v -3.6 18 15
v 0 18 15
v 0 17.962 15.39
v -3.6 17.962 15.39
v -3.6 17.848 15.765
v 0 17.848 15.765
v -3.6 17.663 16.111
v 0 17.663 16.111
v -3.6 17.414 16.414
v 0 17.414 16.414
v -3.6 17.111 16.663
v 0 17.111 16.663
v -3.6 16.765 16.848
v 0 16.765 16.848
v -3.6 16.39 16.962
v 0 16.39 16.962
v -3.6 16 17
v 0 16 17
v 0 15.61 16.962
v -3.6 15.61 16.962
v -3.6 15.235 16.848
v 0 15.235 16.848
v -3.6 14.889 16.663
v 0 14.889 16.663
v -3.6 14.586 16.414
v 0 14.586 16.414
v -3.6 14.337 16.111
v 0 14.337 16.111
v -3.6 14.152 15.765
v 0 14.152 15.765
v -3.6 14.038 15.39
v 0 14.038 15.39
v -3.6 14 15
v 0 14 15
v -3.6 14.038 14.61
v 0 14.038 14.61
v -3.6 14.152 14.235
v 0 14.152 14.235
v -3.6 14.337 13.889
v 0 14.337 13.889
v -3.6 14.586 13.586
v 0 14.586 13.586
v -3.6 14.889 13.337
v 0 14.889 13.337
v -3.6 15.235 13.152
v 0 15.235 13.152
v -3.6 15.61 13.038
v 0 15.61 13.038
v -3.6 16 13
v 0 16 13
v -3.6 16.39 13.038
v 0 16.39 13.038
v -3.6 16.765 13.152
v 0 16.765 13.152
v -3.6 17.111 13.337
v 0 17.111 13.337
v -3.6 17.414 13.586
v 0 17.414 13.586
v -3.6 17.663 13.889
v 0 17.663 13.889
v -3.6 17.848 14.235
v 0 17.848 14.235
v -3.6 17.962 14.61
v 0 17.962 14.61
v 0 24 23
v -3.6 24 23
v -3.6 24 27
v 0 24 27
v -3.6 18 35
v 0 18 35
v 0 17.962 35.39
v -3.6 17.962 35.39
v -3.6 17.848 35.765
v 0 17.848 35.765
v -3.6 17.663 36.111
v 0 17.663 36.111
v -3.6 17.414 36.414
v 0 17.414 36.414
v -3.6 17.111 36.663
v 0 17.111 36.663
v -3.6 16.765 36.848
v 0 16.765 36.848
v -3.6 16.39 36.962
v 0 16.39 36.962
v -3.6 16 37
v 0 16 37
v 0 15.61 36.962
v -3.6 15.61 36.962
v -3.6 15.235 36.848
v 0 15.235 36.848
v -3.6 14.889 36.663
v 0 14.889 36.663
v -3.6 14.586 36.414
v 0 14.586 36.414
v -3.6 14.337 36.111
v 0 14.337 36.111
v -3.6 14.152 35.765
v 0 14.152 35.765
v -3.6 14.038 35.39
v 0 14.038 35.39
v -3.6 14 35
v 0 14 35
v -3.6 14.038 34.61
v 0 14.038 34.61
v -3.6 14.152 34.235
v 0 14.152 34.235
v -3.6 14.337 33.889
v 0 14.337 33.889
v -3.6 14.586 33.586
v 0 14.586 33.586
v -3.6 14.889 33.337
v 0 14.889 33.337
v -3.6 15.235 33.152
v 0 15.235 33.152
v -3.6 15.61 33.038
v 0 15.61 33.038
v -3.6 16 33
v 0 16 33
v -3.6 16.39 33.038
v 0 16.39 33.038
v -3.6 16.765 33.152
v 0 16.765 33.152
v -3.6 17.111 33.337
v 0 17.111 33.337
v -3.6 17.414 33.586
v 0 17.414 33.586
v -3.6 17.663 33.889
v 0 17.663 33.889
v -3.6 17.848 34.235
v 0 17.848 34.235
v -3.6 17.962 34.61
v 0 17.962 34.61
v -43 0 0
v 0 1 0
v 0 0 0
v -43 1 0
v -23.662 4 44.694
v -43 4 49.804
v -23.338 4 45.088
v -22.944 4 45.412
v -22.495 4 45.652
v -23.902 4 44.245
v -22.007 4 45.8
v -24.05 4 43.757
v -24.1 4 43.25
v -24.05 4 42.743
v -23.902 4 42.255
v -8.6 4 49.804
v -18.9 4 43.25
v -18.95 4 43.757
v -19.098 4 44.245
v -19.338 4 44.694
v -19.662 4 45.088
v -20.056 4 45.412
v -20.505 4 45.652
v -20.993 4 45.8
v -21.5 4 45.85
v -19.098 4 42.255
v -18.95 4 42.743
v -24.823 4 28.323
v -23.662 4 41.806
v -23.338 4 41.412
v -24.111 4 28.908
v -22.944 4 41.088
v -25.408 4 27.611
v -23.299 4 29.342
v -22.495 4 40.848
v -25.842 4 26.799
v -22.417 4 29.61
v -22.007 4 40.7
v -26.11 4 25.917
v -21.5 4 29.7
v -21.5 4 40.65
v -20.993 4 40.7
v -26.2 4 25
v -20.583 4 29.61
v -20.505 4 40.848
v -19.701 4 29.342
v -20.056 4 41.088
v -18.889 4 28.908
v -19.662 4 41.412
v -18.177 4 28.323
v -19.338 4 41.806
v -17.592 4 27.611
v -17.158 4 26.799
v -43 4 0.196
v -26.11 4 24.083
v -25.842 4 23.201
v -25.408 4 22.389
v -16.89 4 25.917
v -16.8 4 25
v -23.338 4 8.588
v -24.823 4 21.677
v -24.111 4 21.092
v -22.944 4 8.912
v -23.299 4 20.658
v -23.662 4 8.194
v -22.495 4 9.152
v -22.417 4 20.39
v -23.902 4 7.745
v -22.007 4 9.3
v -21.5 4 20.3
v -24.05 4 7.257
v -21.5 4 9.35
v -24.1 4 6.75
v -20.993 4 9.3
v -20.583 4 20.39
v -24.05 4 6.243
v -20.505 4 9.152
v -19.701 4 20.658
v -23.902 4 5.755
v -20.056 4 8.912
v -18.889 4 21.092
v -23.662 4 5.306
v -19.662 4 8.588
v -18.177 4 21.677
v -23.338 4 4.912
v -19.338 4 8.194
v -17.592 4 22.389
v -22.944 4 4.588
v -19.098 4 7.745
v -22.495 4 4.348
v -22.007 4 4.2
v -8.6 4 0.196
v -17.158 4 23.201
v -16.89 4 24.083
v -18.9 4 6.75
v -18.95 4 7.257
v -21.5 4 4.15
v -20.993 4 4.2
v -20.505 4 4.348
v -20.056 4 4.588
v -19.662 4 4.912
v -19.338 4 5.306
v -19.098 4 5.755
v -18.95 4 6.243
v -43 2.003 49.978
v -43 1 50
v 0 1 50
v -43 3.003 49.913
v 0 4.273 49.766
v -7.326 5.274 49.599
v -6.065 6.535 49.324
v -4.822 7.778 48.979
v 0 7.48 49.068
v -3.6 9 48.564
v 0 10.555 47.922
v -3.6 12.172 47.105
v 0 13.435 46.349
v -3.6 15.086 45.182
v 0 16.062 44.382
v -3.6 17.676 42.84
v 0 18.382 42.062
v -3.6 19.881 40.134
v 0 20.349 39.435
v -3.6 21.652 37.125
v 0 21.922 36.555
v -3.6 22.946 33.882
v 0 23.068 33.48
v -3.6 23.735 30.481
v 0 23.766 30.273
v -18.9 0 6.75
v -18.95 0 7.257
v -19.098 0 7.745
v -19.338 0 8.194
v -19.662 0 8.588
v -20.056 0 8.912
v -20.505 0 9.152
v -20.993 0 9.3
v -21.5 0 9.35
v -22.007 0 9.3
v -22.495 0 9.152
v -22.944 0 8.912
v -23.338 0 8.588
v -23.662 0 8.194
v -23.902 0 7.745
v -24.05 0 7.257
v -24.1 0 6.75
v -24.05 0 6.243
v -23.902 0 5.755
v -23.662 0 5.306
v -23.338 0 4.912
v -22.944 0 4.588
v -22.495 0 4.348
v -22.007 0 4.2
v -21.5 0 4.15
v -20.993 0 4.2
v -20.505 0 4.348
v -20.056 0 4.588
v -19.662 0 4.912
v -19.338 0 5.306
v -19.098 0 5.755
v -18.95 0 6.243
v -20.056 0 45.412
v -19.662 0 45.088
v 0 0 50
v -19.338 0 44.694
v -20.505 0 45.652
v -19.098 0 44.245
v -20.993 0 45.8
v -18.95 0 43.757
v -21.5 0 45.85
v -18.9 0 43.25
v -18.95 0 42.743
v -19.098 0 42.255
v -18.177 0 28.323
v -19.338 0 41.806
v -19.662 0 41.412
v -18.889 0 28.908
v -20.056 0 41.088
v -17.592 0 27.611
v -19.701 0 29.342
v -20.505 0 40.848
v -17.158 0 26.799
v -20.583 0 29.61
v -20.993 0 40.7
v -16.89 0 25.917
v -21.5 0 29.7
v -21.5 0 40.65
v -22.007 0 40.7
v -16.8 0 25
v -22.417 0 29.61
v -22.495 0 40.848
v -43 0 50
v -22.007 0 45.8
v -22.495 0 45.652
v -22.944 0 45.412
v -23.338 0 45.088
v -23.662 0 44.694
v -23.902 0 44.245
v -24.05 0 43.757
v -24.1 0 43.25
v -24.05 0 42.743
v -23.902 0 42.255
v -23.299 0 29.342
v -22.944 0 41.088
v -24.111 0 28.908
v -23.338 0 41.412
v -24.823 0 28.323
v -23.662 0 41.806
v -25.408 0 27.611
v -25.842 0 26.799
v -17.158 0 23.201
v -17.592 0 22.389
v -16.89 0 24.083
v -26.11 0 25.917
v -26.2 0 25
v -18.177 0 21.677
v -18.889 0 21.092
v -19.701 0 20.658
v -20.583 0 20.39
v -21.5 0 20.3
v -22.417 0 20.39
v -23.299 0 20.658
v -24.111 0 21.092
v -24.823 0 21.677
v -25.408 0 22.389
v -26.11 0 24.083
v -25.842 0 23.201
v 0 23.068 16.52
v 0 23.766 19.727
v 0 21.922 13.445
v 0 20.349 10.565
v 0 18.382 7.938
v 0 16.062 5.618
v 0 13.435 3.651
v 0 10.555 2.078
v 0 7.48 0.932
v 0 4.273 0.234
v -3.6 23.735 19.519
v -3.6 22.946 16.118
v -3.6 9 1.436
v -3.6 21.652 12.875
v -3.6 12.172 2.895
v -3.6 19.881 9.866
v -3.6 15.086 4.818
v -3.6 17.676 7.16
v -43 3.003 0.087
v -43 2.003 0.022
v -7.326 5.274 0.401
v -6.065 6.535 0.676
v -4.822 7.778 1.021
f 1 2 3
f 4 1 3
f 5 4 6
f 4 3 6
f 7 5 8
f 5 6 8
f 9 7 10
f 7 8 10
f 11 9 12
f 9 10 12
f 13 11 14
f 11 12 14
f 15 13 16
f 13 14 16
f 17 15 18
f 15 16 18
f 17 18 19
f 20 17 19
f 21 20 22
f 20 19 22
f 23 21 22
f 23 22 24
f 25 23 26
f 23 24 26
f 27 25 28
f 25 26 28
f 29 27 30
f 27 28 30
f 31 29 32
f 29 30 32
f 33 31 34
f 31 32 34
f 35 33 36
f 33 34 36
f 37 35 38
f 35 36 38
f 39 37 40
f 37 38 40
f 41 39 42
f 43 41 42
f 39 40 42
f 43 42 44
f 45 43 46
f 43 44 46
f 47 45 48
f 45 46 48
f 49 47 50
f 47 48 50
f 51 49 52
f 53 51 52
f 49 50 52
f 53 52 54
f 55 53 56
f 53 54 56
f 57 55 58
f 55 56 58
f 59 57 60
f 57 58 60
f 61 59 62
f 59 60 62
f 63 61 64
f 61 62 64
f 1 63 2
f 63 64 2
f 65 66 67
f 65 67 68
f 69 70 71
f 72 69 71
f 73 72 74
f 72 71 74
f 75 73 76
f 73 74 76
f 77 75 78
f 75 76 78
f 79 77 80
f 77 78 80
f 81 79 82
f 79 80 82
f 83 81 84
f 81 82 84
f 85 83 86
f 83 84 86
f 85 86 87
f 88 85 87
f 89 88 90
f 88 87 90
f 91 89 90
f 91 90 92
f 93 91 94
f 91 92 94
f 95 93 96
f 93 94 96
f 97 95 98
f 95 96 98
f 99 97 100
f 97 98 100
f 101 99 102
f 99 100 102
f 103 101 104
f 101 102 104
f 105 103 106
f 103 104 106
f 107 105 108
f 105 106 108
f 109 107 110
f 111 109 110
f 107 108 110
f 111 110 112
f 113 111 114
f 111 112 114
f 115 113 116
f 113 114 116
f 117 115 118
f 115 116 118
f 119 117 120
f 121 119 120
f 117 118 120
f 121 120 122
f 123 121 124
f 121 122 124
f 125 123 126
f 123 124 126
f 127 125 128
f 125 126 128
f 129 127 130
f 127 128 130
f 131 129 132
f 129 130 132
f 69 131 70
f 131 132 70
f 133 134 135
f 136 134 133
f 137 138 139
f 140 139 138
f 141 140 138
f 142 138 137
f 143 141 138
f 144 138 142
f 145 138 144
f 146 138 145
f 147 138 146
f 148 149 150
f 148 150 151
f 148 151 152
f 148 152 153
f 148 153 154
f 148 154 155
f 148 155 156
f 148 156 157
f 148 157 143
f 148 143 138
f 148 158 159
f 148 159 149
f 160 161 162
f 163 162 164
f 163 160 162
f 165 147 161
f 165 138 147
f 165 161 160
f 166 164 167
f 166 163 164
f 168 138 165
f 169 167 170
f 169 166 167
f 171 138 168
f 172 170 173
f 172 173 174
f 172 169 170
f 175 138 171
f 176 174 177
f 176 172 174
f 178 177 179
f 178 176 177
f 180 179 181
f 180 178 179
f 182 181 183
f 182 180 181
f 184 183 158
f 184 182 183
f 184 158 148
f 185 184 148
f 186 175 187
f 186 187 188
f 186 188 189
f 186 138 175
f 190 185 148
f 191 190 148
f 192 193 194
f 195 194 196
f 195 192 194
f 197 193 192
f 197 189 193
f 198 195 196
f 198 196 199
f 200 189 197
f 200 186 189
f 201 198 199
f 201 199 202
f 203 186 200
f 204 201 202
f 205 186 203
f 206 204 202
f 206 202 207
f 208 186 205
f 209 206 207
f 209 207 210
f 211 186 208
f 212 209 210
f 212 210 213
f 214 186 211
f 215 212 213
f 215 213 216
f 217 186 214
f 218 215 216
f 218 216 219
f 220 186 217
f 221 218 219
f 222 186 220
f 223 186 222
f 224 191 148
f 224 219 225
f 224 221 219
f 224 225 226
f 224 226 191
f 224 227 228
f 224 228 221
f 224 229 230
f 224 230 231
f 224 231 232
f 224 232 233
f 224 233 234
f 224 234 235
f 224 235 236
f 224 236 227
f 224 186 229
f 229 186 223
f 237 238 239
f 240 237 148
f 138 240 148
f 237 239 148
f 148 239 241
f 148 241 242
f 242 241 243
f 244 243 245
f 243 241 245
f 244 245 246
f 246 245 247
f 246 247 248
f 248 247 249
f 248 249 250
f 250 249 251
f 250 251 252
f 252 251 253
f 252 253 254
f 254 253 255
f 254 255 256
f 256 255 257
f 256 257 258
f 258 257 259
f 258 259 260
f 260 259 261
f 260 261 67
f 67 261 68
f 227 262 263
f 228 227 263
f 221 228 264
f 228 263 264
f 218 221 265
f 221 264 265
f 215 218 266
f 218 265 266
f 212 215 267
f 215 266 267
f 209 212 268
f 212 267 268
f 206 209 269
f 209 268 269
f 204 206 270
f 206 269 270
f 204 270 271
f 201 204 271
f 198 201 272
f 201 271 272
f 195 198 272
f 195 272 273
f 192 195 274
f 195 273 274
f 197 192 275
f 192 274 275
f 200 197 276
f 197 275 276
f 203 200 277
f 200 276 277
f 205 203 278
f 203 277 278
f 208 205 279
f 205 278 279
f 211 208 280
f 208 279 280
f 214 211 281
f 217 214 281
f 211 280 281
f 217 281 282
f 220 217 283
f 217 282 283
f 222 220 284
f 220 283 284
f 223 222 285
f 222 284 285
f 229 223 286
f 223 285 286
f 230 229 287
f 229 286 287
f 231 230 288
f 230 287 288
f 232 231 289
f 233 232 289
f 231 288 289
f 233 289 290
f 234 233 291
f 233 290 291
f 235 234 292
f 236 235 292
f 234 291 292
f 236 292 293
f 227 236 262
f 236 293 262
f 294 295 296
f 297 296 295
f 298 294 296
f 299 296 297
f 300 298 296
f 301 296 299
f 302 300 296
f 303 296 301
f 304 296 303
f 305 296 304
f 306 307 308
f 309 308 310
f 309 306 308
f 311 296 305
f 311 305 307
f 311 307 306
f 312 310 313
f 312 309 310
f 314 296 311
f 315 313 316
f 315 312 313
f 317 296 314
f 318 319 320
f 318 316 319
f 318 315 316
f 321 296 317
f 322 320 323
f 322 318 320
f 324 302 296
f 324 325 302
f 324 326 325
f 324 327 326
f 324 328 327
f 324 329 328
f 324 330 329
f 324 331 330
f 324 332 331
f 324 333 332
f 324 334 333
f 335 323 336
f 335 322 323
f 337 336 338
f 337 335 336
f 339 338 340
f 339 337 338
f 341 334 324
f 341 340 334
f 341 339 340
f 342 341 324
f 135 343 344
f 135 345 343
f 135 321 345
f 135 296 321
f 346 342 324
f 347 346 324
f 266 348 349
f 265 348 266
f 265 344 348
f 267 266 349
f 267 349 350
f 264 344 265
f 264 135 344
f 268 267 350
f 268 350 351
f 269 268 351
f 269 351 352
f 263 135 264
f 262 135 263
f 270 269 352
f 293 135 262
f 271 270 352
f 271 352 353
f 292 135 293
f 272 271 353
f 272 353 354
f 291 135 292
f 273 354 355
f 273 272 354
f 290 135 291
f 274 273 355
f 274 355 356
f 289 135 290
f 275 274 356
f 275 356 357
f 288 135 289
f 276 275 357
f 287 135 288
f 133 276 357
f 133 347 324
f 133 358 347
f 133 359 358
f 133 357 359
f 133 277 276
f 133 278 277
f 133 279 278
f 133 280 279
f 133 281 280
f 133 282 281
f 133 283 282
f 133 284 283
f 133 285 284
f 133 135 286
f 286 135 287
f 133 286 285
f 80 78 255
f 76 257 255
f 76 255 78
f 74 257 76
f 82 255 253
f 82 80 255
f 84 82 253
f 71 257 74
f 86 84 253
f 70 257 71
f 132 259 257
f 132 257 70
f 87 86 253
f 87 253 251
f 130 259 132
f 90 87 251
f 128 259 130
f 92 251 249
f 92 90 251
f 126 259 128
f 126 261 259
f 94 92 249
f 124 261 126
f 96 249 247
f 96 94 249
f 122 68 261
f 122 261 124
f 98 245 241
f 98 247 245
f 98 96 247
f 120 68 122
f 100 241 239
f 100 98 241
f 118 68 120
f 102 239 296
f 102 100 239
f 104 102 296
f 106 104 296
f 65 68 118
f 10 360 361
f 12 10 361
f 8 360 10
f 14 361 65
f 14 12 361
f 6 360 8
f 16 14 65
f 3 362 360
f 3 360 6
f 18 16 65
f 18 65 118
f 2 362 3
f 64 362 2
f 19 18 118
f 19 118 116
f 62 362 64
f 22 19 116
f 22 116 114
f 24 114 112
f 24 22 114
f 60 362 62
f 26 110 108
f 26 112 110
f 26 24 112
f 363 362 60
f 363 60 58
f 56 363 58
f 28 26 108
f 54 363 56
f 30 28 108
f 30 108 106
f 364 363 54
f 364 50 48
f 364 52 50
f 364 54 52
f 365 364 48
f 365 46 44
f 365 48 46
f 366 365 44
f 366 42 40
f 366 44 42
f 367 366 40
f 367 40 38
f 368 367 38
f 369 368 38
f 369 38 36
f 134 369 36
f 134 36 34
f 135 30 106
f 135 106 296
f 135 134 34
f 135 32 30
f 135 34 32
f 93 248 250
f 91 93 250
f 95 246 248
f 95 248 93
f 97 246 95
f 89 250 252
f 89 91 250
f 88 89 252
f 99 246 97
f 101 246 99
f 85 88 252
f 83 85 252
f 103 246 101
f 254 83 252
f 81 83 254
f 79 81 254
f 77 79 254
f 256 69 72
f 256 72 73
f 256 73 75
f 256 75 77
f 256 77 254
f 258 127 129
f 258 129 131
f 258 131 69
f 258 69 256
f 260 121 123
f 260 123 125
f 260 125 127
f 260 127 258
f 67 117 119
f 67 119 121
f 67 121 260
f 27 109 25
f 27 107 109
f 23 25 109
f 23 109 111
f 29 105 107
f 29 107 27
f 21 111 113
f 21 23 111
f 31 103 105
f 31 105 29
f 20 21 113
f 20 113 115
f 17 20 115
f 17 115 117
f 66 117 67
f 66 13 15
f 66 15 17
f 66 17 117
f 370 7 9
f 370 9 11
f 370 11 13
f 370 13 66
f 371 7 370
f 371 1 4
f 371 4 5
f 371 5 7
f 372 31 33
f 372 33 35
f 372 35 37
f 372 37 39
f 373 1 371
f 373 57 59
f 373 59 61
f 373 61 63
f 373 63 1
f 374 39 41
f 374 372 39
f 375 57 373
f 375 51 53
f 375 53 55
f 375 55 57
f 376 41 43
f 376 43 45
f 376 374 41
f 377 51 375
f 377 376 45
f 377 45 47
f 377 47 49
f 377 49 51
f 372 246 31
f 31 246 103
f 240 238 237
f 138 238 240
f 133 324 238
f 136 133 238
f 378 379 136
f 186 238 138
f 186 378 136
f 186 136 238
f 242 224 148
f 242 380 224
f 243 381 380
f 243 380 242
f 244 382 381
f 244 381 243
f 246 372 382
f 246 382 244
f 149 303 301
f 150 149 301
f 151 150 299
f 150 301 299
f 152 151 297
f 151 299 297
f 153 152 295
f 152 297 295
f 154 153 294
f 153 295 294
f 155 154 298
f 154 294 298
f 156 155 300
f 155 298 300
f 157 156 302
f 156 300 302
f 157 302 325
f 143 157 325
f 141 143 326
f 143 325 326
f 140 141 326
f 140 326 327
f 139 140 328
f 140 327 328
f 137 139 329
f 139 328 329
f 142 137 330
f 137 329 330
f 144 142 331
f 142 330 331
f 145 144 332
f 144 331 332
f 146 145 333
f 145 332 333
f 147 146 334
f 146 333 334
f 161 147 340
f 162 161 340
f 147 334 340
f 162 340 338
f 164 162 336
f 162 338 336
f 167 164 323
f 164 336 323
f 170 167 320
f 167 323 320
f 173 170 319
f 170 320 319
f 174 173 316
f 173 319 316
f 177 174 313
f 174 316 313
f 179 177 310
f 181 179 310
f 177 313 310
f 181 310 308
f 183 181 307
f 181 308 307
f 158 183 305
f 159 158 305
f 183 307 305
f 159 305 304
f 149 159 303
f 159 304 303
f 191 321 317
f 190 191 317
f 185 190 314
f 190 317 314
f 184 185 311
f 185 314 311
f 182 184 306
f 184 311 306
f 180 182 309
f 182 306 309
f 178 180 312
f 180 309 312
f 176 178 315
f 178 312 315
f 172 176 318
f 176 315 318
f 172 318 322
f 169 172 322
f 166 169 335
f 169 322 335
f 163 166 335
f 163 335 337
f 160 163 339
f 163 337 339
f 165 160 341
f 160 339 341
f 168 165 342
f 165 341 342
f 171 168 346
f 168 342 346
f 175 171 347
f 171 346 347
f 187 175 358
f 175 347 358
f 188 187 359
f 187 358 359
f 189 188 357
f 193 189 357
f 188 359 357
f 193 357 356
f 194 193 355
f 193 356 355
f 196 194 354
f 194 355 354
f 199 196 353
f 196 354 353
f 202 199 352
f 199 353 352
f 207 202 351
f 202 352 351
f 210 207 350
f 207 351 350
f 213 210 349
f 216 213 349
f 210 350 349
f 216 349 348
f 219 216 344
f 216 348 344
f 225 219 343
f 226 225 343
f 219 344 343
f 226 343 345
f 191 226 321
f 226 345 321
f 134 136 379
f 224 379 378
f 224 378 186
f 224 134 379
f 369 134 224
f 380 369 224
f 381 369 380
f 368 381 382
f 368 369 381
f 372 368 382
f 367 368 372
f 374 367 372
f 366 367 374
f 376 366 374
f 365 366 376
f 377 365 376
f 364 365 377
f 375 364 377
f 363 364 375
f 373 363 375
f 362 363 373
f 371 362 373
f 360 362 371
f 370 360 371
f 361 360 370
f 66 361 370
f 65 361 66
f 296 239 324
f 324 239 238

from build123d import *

# Parameters (mm, degrees)
PAD003_DEPTH    = 50
SKETCH_R        = 2.6
SKETCH_R_2      = 4.7
POCKET_DEPTH    = 4
SKETCH005_R     = 2
POCKET001_DEPTH = 3.6
CHAMFER_SIZE    = 5
FILLET_R        = 23


with BuildPart() as part:
    # Sketch003 → Pad003 (new body)
    with BuildSketch(Plane.XY):
        Polygon((-43, 4), (-3.6, 4), (-3.6, 24), (0, 24), (0, 0), (-43, 0), align=None)
    extrude(amount=PAD003_DEPTH)

    # Sketch → Pocket (cut)
    with BuildSketch(Plane.XZ):
        with Locations((-21.5, 43.25)):
            Circle(SKETCH_R)
        with Locations((-21.5, 6.75)):
            Circle(SKETCH_R)
        with Locations((-21.5, 25)):
            Circle(SKETCH_R_2)
    extrude(amount=-POCKET_DEPTH, mode=Mode.SUBTRACT)

    # Sketch005 → Pocket001 (cut)
    with BuildSketch(Plane.YZ):
        with Locations((16, 35)):
            Circle(SKETCH005_R)
        with Locations((16, 15)):
            Circle(SKETCH005_R)
    extrude(amount=-POCKET001_DEPTH, mode=Mode.SUBTRACT)

    # Chamfer
    chamfer_edges = [part.edges().sort_by_distance(p)[0] for p in [
        (-3.6, 4, 25),
    ]]
    chamfer(chamfer_edges, length=CHAMFER_SIZE)

    # Fillet
    fillet_edges = [part.edges().sort_by_distance(p)[0] for p in [
        (-1.8, 24, 0),
        (-1.8, 24, 50),
    ]]
    fillet(fillet_edges, radius=FILLET_R)


solid = part.part
